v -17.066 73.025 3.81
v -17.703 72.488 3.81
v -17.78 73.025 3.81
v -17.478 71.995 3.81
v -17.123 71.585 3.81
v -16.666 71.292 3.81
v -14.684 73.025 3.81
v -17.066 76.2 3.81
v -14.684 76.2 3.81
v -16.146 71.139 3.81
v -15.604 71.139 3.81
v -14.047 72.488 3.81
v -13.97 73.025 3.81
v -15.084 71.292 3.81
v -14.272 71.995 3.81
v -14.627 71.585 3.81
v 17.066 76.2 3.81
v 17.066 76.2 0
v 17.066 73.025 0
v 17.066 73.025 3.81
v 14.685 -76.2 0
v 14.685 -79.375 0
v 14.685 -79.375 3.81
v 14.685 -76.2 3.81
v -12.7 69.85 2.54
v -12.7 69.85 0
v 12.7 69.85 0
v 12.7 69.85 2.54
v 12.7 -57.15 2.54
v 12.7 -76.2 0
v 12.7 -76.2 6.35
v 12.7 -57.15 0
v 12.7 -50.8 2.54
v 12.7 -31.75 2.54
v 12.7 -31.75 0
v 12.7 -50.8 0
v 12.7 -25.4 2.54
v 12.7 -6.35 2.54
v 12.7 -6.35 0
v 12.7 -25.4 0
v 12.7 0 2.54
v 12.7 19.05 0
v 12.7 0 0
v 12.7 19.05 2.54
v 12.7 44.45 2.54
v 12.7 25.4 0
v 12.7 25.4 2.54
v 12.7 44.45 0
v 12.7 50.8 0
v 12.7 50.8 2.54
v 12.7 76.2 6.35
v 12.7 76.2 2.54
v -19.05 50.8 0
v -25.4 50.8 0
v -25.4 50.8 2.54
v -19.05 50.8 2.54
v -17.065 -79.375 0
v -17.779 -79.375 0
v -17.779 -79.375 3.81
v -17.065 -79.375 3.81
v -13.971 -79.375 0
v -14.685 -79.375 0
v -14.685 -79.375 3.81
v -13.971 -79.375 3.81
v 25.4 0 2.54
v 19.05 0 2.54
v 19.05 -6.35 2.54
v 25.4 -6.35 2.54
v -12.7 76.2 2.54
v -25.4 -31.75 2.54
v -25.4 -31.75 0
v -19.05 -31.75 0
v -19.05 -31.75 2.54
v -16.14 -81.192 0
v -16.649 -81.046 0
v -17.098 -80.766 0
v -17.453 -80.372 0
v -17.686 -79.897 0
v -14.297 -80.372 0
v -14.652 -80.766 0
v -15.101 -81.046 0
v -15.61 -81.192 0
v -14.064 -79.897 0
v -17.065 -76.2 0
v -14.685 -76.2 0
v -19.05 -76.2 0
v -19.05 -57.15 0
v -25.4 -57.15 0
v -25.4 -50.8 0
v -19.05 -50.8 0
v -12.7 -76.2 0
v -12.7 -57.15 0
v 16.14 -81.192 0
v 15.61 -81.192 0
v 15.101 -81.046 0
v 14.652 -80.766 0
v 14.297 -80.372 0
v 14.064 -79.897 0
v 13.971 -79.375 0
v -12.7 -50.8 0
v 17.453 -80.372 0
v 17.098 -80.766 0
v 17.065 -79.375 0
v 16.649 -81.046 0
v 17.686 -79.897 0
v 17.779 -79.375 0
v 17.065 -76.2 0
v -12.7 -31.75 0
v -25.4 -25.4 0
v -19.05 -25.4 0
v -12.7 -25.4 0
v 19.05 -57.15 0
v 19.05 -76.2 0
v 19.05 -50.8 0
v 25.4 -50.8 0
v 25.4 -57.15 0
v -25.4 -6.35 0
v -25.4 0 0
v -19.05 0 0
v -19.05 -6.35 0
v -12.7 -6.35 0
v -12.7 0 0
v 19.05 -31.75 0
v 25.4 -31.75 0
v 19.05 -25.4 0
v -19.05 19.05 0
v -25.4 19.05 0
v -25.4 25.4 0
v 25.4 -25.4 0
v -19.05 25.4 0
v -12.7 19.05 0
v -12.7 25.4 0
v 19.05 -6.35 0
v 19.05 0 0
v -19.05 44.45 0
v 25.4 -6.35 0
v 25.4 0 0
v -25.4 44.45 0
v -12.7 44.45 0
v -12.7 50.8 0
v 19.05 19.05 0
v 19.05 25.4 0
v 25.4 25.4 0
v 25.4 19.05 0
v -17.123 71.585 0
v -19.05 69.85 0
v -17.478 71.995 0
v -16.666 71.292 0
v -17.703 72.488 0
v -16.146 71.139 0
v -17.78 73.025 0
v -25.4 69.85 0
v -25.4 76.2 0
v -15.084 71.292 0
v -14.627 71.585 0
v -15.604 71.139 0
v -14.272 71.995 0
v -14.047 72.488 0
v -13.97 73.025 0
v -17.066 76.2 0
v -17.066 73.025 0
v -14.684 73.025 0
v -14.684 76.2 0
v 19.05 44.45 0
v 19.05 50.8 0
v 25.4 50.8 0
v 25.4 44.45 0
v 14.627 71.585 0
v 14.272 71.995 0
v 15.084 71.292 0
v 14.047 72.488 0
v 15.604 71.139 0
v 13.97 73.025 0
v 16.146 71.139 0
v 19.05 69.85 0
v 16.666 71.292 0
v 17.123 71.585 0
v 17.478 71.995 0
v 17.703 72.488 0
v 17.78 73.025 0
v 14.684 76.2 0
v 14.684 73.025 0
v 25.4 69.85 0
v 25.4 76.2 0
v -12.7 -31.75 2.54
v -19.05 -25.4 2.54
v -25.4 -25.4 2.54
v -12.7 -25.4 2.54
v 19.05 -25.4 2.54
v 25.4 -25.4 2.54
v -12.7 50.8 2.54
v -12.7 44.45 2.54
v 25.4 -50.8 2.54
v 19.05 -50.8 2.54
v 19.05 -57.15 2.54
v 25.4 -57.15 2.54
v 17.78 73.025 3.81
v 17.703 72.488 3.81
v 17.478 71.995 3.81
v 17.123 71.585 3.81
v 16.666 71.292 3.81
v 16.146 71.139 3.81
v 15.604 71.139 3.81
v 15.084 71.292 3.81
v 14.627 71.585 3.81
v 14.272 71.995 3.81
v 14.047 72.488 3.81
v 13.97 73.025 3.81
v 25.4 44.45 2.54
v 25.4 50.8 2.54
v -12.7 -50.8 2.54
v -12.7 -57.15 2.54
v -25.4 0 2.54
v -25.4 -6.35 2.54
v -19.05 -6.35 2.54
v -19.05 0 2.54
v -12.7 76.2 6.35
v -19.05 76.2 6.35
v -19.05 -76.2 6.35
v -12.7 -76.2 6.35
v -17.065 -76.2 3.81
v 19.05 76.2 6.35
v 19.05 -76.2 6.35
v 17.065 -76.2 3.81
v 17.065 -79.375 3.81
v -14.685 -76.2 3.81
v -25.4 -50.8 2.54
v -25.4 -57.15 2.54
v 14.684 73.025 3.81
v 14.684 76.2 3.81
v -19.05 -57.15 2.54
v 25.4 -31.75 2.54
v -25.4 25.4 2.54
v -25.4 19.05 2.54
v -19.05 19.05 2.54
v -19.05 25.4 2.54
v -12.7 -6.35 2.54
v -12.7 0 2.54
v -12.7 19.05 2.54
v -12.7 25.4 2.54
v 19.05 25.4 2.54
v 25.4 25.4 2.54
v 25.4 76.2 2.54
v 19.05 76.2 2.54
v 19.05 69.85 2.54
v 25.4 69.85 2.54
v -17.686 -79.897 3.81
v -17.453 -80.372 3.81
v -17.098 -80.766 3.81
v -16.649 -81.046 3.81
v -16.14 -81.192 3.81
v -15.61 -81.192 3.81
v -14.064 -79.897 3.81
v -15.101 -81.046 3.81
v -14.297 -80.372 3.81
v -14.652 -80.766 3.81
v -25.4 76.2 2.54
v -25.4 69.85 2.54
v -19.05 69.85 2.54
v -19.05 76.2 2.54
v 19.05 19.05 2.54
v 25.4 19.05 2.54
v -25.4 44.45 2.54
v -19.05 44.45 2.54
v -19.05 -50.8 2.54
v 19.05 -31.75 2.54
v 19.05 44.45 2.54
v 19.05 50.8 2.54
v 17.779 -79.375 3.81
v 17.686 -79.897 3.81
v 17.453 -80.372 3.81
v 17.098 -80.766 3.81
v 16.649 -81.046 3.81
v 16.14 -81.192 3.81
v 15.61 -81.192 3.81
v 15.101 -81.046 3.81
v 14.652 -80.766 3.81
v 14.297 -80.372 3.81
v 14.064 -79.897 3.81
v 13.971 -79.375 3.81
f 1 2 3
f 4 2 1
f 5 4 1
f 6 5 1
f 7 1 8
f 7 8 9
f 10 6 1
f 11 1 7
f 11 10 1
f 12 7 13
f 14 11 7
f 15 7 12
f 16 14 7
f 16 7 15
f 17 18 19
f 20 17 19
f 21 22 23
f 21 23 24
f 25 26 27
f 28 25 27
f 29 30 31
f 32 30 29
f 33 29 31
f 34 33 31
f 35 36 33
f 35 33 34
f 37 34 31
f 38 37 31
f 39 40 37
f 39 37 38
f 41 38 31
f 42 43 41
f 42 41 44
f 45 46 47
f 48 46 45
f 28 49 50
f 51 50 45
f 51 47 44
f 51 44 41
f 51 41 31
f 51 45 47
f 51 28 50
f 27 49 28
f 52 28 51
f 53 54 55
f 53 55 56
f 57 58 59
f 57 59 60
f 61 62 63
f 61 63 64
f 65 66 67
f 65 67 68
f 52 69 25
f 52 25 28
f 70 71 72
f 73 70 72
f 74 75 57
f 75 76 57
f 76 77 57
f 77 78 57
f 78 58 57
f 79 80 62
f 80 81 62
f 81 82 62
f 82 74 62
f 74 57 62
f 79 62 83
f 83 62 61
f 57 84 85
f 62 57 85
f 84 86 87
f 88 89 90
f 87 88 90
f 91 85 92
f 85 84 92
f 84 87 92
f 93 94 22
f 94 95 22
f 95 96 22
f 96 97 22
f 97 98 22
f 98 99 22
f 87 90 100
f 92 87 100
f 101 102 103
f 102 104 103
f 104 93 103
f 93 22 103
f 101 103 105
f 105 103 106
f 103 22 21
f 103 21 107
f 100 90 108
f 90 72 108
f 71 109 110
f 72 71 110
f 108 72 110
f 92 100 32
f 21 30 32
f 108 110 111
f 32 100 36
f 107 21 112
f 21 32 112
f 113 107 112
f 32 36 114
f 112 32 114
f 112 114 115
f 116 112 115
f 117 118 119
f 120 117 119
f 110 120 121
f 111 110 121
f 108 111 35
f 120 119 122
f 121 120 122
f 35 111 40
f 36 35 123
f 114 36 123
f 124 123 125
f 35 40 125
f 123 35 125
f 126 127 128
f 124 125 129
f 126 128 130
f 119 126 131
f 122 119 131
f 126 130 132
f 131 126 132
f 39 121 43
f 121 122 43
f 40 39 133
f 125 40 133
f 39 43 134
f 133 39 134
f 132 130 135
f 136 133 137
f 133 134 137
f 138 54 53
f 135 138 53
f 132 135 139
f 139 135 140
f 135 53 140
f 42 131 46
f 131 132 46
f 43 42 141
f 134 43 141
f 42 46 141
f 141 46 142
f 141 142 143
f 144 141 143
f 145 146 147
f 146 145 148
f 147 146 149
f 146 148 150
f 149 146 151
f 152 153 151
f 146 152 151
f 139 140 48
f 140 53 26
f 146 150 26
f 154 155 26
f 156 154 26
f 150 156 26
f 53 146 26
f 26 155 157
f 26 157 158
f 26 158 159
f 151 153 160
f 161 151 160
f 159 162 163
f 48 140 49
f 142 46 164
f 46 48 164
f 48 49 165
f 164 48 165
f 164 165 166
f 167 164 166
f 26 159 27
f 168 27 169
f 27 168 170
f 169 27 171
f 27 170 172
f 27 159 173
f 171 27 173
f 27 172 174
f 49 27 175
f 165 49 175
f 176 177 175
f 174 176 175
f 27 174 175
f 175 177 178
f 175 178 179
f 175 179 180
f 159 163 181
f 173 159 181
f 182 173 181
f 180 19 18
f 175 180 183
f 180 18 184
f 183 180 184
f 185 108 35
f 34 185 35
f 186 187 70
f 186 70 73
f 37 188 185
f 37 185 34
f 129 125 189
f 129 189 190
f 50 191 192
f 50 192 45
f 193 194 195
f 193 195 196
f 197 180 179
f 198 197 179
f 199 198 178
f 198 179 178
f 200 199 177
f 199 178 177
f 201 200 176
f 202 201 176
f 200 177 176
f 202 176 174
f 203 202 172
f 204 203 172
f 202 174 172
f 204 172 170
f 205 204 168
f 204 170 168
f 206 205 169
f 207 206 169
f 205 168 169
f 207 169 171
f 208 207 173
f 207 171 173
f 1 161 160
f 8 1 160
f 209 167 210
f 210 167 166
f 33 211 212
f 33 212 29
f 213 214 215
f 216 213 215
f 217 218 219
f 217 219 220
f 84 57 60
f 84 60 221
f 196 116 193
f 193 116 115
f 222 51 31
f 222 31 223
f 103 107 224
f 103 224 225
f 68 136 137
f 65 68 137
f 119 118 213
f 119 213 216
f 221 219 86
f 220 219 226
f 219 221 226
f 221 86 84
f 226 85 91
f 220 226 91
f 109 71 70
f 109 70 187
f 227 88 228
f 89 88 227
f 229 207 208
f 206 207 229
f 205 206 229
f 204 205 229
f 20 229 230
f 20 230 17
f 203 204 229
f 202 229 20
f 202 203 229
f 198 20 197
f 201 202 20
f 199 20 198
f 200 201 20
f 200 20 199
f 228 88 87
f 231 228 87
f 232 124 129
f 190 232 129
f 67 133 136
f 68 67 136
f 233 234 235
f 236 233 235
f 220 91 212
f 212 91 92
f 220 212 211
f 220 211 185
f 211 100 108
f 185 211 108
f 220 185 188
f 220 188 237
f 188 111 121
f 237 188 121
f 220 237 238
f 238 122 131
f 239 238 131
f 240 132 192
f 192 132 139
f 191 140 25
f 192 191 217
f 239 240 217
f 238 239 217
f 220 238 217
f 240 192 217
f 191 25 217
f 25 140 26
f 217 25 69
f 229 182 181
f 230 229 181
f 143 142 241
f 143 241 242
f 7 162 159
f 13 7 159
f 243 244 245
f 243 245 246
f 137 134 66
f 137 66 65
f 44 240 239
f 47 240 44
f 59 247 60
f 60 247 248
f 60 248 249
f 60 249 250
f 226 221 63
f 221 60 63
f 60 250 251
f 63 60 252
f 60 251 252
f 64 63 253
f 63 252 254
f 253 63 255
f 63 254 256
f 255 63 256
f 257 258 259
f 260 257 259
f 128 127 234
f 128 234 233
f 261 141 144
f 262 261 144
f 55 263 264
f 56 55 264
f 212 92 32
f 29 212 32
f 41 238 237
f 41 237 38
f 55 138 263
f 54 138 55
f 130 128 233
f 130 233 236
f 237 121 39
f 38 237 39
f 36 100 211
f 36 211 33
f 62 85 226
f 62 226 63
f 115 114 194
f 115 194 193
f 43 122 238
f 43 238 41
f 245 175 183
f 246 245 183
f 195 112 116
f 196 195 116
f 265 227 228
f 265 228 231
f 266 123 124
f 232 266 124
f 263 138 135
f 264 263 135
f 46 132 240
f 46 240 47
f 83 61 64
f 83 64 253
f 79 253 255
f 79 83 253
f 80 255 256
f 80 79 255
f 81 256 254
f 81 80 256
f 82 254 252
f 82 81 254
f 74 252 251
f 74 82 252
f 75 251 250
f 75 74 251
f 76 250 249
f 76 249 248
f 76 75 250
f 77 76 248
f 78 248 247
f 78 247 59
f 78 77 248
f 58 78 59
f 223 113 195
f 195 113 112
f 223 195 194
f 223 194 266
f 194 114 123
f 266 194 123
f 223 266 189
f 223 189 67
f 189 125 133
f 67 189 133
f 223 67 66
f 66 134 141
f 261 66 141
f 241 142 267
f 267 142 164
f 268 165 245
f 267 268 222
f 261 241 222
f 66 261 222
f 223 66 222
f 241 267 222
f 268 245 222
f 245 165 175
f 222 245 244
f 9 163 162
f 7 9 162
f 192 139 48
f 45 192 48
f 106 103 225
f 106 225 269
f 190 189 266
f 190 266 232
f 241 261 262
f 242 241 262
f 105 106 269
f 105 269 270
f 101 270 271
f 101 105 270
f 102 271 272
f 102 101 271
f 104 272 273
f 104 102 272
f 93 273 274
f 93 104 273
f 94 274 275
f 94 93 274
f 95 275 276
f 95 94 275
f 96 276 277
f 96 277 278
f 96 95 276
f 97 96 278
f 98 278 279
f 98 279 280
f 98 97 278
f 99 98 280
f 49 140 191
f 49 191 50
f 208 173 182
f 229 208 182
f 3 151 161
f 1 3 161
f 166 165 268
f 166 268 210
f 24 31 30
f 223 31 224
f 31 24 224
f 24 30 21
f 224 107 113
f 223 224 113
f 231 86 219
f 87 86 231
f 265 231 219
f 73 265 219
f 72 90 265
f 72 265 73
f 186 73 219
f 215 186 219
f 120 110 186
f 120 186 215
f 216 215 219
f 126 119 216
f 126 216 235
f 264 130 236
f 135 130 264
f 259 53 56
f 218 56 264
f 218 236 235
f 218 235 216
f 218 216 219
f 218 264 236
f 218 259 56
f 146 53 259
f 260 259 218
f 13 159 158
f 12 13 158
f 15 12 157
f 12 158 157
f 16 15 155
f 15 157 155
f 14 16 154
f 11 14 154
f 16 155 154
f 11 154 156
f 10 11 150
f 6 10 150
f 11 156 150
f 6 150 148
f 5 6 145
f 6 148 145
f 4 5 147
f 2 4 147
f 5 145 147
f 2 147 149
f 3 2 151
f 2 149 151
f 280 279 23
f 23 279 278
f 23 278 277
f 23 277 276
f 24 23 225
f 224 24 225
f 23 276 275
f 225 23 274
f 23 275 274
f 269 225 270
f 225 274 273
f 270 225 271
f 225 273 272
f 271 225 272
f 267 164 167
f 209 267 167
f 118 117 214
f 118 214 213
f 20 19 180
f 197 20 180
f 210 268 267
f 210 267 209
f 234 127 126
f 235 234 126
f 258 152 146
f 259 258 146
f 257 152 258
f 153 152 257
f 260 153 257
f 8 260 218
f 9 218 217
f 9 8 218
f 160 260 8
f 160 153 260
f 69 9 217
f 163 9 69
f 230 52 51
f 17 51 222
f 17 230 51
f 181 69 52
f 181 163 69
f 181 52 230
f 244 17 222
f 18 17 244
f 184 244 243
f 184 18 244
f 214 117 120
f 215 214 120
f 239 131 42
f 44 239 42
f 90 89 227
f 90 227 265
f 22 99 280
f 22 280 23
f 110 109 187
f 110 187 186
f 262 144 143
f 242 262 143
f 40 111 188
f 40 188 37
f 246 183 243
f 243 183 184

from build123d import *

# Parameters (mm, degrees)
F0_W     = 6.35
F0_H     = 152.4
F1_DEPTH = 6.35
F2_W     = 50.8
F2_H     = 6.35
F3_DEPTH = 2.54
F5_DEPTH = 3.81
F7_DEPTH = 3.81


with BuildPart() as f1:
    # F0 (on Top) → F1 (new body)
    with BuildSketch(Plane.XY):
        with Locations((-15.875, 0)):
            Rectangle(F0_W, F0_H)
        with Locations((15.875, 0)):
            Rectangle(F0_W, F0_H)
    extrude(amount=F1_DEPTH)

    # F2 (on Top) → F3 (join)
    with BuildSketch(Plane.XY):
        with Locations((0, -53.975)):
            Rectangle(F2_W, F2_H)
        with Locations((0, -28.575)):
            Rectangle(F2_W, F2_H)
        with Locations((0, -3.175)):
            Rectangle(F2_W, F2_H)
        with Locations((0, 22.225)):
            Rectangle(F2_W, F2_H)
        with Locations((0, 47.625)):
            Rectangle(F2_W, F2_H)
        with Locations((0, 73.025)):
            Rectangle(F2_W, F2_H)
    extrude(amount=F3_DEPTH)

    # F4 (on face) → F5 (cut)
    with BuildSketch(Plane(origin=(0, 0, 0), x_dir=(1, 0, 0), z_dir=(0, 0, -1))):
        with BuildLine():
            Line((17.065625, -73.025), (17.78, -73.025))
            ThreePointArc((17.78, -73.025), (15.875, -71.12), (13.97, -73.025))
            Line((13.97, -73.025), (14.684375, -73.025))
            Line((14.684375, -73.025), (14.684375, -76.2))
            Line((14.684375, -76.2), (17.065625, -76.2))
            Line((17.065625, -76.2), (17.065625, -73.025))
        make_face()
        with BuildLine():
            Line((-17.78, -73.025), (-17.065625, -73.025))
            Line((-17.065625, -73.025), (-17.065625, -76.2))
            Line((-17.065625, -76.2), (-14.684375, -76.2))
            Line((-14.684375, -76.2), (-14.684375, -73.025))
            Line((-14.684375, -73.025), (-13.97, -73.025))
            ThreePointArc((-13.97, -73.025), (-15.875, -71.12), (-17.78, -73.025))
        make_face()
    extrude(amount=-F5_DEPTH, mode=Mode.SUBTRACT)

    # F6 (on face) → F7 (join)
    with BuildSketch(Plane(origin=(0, 0, 0), x_dir=(1, 0, 0), z_dir=(0, 0, -1))):
        with BuildLine():
            Line((-17.06499, 76.2), (-15.875, 76.2))
            Line((-15.875, 76.2), (-14.68501, 76.2))
            Line((-14.68501, 76.2), (-14.68501, 79.375))
            Line((-14.68501, 79.375), (-13.97127, 79.375))
            ThreePointArc((-13.97127, 79.375), (-15.875, 81.210451), (-17.77873, 79.375))
            Line((-17.77873, 79.375), (-17.06499, 79.375))
            Line((-17.06499, 79.375), (-17.06499, 76.2))
        make_face()
        with BuildLine():
            ThreePointArc((17.77873, 79.375), (15.875, 81.210451), (13.97127, 79.375))
            Line((13.97127, 79.375), (14.68501, 79.375))
            Line((14.68501, 79.375), (14.68501, 76.2))
            Line((14.68501, 76.2), (15.875, 76.2))
            Line((15.875, 76.2), (17.06499, 76.2))
            Line((17.06499, 76.2), (17.06499, 79.375))
            Line((17.06499, 79.375), (17.77873, 79.375))
        make_face()
    extrude(amount=-F7_DEPTH)


solid = f1.part
